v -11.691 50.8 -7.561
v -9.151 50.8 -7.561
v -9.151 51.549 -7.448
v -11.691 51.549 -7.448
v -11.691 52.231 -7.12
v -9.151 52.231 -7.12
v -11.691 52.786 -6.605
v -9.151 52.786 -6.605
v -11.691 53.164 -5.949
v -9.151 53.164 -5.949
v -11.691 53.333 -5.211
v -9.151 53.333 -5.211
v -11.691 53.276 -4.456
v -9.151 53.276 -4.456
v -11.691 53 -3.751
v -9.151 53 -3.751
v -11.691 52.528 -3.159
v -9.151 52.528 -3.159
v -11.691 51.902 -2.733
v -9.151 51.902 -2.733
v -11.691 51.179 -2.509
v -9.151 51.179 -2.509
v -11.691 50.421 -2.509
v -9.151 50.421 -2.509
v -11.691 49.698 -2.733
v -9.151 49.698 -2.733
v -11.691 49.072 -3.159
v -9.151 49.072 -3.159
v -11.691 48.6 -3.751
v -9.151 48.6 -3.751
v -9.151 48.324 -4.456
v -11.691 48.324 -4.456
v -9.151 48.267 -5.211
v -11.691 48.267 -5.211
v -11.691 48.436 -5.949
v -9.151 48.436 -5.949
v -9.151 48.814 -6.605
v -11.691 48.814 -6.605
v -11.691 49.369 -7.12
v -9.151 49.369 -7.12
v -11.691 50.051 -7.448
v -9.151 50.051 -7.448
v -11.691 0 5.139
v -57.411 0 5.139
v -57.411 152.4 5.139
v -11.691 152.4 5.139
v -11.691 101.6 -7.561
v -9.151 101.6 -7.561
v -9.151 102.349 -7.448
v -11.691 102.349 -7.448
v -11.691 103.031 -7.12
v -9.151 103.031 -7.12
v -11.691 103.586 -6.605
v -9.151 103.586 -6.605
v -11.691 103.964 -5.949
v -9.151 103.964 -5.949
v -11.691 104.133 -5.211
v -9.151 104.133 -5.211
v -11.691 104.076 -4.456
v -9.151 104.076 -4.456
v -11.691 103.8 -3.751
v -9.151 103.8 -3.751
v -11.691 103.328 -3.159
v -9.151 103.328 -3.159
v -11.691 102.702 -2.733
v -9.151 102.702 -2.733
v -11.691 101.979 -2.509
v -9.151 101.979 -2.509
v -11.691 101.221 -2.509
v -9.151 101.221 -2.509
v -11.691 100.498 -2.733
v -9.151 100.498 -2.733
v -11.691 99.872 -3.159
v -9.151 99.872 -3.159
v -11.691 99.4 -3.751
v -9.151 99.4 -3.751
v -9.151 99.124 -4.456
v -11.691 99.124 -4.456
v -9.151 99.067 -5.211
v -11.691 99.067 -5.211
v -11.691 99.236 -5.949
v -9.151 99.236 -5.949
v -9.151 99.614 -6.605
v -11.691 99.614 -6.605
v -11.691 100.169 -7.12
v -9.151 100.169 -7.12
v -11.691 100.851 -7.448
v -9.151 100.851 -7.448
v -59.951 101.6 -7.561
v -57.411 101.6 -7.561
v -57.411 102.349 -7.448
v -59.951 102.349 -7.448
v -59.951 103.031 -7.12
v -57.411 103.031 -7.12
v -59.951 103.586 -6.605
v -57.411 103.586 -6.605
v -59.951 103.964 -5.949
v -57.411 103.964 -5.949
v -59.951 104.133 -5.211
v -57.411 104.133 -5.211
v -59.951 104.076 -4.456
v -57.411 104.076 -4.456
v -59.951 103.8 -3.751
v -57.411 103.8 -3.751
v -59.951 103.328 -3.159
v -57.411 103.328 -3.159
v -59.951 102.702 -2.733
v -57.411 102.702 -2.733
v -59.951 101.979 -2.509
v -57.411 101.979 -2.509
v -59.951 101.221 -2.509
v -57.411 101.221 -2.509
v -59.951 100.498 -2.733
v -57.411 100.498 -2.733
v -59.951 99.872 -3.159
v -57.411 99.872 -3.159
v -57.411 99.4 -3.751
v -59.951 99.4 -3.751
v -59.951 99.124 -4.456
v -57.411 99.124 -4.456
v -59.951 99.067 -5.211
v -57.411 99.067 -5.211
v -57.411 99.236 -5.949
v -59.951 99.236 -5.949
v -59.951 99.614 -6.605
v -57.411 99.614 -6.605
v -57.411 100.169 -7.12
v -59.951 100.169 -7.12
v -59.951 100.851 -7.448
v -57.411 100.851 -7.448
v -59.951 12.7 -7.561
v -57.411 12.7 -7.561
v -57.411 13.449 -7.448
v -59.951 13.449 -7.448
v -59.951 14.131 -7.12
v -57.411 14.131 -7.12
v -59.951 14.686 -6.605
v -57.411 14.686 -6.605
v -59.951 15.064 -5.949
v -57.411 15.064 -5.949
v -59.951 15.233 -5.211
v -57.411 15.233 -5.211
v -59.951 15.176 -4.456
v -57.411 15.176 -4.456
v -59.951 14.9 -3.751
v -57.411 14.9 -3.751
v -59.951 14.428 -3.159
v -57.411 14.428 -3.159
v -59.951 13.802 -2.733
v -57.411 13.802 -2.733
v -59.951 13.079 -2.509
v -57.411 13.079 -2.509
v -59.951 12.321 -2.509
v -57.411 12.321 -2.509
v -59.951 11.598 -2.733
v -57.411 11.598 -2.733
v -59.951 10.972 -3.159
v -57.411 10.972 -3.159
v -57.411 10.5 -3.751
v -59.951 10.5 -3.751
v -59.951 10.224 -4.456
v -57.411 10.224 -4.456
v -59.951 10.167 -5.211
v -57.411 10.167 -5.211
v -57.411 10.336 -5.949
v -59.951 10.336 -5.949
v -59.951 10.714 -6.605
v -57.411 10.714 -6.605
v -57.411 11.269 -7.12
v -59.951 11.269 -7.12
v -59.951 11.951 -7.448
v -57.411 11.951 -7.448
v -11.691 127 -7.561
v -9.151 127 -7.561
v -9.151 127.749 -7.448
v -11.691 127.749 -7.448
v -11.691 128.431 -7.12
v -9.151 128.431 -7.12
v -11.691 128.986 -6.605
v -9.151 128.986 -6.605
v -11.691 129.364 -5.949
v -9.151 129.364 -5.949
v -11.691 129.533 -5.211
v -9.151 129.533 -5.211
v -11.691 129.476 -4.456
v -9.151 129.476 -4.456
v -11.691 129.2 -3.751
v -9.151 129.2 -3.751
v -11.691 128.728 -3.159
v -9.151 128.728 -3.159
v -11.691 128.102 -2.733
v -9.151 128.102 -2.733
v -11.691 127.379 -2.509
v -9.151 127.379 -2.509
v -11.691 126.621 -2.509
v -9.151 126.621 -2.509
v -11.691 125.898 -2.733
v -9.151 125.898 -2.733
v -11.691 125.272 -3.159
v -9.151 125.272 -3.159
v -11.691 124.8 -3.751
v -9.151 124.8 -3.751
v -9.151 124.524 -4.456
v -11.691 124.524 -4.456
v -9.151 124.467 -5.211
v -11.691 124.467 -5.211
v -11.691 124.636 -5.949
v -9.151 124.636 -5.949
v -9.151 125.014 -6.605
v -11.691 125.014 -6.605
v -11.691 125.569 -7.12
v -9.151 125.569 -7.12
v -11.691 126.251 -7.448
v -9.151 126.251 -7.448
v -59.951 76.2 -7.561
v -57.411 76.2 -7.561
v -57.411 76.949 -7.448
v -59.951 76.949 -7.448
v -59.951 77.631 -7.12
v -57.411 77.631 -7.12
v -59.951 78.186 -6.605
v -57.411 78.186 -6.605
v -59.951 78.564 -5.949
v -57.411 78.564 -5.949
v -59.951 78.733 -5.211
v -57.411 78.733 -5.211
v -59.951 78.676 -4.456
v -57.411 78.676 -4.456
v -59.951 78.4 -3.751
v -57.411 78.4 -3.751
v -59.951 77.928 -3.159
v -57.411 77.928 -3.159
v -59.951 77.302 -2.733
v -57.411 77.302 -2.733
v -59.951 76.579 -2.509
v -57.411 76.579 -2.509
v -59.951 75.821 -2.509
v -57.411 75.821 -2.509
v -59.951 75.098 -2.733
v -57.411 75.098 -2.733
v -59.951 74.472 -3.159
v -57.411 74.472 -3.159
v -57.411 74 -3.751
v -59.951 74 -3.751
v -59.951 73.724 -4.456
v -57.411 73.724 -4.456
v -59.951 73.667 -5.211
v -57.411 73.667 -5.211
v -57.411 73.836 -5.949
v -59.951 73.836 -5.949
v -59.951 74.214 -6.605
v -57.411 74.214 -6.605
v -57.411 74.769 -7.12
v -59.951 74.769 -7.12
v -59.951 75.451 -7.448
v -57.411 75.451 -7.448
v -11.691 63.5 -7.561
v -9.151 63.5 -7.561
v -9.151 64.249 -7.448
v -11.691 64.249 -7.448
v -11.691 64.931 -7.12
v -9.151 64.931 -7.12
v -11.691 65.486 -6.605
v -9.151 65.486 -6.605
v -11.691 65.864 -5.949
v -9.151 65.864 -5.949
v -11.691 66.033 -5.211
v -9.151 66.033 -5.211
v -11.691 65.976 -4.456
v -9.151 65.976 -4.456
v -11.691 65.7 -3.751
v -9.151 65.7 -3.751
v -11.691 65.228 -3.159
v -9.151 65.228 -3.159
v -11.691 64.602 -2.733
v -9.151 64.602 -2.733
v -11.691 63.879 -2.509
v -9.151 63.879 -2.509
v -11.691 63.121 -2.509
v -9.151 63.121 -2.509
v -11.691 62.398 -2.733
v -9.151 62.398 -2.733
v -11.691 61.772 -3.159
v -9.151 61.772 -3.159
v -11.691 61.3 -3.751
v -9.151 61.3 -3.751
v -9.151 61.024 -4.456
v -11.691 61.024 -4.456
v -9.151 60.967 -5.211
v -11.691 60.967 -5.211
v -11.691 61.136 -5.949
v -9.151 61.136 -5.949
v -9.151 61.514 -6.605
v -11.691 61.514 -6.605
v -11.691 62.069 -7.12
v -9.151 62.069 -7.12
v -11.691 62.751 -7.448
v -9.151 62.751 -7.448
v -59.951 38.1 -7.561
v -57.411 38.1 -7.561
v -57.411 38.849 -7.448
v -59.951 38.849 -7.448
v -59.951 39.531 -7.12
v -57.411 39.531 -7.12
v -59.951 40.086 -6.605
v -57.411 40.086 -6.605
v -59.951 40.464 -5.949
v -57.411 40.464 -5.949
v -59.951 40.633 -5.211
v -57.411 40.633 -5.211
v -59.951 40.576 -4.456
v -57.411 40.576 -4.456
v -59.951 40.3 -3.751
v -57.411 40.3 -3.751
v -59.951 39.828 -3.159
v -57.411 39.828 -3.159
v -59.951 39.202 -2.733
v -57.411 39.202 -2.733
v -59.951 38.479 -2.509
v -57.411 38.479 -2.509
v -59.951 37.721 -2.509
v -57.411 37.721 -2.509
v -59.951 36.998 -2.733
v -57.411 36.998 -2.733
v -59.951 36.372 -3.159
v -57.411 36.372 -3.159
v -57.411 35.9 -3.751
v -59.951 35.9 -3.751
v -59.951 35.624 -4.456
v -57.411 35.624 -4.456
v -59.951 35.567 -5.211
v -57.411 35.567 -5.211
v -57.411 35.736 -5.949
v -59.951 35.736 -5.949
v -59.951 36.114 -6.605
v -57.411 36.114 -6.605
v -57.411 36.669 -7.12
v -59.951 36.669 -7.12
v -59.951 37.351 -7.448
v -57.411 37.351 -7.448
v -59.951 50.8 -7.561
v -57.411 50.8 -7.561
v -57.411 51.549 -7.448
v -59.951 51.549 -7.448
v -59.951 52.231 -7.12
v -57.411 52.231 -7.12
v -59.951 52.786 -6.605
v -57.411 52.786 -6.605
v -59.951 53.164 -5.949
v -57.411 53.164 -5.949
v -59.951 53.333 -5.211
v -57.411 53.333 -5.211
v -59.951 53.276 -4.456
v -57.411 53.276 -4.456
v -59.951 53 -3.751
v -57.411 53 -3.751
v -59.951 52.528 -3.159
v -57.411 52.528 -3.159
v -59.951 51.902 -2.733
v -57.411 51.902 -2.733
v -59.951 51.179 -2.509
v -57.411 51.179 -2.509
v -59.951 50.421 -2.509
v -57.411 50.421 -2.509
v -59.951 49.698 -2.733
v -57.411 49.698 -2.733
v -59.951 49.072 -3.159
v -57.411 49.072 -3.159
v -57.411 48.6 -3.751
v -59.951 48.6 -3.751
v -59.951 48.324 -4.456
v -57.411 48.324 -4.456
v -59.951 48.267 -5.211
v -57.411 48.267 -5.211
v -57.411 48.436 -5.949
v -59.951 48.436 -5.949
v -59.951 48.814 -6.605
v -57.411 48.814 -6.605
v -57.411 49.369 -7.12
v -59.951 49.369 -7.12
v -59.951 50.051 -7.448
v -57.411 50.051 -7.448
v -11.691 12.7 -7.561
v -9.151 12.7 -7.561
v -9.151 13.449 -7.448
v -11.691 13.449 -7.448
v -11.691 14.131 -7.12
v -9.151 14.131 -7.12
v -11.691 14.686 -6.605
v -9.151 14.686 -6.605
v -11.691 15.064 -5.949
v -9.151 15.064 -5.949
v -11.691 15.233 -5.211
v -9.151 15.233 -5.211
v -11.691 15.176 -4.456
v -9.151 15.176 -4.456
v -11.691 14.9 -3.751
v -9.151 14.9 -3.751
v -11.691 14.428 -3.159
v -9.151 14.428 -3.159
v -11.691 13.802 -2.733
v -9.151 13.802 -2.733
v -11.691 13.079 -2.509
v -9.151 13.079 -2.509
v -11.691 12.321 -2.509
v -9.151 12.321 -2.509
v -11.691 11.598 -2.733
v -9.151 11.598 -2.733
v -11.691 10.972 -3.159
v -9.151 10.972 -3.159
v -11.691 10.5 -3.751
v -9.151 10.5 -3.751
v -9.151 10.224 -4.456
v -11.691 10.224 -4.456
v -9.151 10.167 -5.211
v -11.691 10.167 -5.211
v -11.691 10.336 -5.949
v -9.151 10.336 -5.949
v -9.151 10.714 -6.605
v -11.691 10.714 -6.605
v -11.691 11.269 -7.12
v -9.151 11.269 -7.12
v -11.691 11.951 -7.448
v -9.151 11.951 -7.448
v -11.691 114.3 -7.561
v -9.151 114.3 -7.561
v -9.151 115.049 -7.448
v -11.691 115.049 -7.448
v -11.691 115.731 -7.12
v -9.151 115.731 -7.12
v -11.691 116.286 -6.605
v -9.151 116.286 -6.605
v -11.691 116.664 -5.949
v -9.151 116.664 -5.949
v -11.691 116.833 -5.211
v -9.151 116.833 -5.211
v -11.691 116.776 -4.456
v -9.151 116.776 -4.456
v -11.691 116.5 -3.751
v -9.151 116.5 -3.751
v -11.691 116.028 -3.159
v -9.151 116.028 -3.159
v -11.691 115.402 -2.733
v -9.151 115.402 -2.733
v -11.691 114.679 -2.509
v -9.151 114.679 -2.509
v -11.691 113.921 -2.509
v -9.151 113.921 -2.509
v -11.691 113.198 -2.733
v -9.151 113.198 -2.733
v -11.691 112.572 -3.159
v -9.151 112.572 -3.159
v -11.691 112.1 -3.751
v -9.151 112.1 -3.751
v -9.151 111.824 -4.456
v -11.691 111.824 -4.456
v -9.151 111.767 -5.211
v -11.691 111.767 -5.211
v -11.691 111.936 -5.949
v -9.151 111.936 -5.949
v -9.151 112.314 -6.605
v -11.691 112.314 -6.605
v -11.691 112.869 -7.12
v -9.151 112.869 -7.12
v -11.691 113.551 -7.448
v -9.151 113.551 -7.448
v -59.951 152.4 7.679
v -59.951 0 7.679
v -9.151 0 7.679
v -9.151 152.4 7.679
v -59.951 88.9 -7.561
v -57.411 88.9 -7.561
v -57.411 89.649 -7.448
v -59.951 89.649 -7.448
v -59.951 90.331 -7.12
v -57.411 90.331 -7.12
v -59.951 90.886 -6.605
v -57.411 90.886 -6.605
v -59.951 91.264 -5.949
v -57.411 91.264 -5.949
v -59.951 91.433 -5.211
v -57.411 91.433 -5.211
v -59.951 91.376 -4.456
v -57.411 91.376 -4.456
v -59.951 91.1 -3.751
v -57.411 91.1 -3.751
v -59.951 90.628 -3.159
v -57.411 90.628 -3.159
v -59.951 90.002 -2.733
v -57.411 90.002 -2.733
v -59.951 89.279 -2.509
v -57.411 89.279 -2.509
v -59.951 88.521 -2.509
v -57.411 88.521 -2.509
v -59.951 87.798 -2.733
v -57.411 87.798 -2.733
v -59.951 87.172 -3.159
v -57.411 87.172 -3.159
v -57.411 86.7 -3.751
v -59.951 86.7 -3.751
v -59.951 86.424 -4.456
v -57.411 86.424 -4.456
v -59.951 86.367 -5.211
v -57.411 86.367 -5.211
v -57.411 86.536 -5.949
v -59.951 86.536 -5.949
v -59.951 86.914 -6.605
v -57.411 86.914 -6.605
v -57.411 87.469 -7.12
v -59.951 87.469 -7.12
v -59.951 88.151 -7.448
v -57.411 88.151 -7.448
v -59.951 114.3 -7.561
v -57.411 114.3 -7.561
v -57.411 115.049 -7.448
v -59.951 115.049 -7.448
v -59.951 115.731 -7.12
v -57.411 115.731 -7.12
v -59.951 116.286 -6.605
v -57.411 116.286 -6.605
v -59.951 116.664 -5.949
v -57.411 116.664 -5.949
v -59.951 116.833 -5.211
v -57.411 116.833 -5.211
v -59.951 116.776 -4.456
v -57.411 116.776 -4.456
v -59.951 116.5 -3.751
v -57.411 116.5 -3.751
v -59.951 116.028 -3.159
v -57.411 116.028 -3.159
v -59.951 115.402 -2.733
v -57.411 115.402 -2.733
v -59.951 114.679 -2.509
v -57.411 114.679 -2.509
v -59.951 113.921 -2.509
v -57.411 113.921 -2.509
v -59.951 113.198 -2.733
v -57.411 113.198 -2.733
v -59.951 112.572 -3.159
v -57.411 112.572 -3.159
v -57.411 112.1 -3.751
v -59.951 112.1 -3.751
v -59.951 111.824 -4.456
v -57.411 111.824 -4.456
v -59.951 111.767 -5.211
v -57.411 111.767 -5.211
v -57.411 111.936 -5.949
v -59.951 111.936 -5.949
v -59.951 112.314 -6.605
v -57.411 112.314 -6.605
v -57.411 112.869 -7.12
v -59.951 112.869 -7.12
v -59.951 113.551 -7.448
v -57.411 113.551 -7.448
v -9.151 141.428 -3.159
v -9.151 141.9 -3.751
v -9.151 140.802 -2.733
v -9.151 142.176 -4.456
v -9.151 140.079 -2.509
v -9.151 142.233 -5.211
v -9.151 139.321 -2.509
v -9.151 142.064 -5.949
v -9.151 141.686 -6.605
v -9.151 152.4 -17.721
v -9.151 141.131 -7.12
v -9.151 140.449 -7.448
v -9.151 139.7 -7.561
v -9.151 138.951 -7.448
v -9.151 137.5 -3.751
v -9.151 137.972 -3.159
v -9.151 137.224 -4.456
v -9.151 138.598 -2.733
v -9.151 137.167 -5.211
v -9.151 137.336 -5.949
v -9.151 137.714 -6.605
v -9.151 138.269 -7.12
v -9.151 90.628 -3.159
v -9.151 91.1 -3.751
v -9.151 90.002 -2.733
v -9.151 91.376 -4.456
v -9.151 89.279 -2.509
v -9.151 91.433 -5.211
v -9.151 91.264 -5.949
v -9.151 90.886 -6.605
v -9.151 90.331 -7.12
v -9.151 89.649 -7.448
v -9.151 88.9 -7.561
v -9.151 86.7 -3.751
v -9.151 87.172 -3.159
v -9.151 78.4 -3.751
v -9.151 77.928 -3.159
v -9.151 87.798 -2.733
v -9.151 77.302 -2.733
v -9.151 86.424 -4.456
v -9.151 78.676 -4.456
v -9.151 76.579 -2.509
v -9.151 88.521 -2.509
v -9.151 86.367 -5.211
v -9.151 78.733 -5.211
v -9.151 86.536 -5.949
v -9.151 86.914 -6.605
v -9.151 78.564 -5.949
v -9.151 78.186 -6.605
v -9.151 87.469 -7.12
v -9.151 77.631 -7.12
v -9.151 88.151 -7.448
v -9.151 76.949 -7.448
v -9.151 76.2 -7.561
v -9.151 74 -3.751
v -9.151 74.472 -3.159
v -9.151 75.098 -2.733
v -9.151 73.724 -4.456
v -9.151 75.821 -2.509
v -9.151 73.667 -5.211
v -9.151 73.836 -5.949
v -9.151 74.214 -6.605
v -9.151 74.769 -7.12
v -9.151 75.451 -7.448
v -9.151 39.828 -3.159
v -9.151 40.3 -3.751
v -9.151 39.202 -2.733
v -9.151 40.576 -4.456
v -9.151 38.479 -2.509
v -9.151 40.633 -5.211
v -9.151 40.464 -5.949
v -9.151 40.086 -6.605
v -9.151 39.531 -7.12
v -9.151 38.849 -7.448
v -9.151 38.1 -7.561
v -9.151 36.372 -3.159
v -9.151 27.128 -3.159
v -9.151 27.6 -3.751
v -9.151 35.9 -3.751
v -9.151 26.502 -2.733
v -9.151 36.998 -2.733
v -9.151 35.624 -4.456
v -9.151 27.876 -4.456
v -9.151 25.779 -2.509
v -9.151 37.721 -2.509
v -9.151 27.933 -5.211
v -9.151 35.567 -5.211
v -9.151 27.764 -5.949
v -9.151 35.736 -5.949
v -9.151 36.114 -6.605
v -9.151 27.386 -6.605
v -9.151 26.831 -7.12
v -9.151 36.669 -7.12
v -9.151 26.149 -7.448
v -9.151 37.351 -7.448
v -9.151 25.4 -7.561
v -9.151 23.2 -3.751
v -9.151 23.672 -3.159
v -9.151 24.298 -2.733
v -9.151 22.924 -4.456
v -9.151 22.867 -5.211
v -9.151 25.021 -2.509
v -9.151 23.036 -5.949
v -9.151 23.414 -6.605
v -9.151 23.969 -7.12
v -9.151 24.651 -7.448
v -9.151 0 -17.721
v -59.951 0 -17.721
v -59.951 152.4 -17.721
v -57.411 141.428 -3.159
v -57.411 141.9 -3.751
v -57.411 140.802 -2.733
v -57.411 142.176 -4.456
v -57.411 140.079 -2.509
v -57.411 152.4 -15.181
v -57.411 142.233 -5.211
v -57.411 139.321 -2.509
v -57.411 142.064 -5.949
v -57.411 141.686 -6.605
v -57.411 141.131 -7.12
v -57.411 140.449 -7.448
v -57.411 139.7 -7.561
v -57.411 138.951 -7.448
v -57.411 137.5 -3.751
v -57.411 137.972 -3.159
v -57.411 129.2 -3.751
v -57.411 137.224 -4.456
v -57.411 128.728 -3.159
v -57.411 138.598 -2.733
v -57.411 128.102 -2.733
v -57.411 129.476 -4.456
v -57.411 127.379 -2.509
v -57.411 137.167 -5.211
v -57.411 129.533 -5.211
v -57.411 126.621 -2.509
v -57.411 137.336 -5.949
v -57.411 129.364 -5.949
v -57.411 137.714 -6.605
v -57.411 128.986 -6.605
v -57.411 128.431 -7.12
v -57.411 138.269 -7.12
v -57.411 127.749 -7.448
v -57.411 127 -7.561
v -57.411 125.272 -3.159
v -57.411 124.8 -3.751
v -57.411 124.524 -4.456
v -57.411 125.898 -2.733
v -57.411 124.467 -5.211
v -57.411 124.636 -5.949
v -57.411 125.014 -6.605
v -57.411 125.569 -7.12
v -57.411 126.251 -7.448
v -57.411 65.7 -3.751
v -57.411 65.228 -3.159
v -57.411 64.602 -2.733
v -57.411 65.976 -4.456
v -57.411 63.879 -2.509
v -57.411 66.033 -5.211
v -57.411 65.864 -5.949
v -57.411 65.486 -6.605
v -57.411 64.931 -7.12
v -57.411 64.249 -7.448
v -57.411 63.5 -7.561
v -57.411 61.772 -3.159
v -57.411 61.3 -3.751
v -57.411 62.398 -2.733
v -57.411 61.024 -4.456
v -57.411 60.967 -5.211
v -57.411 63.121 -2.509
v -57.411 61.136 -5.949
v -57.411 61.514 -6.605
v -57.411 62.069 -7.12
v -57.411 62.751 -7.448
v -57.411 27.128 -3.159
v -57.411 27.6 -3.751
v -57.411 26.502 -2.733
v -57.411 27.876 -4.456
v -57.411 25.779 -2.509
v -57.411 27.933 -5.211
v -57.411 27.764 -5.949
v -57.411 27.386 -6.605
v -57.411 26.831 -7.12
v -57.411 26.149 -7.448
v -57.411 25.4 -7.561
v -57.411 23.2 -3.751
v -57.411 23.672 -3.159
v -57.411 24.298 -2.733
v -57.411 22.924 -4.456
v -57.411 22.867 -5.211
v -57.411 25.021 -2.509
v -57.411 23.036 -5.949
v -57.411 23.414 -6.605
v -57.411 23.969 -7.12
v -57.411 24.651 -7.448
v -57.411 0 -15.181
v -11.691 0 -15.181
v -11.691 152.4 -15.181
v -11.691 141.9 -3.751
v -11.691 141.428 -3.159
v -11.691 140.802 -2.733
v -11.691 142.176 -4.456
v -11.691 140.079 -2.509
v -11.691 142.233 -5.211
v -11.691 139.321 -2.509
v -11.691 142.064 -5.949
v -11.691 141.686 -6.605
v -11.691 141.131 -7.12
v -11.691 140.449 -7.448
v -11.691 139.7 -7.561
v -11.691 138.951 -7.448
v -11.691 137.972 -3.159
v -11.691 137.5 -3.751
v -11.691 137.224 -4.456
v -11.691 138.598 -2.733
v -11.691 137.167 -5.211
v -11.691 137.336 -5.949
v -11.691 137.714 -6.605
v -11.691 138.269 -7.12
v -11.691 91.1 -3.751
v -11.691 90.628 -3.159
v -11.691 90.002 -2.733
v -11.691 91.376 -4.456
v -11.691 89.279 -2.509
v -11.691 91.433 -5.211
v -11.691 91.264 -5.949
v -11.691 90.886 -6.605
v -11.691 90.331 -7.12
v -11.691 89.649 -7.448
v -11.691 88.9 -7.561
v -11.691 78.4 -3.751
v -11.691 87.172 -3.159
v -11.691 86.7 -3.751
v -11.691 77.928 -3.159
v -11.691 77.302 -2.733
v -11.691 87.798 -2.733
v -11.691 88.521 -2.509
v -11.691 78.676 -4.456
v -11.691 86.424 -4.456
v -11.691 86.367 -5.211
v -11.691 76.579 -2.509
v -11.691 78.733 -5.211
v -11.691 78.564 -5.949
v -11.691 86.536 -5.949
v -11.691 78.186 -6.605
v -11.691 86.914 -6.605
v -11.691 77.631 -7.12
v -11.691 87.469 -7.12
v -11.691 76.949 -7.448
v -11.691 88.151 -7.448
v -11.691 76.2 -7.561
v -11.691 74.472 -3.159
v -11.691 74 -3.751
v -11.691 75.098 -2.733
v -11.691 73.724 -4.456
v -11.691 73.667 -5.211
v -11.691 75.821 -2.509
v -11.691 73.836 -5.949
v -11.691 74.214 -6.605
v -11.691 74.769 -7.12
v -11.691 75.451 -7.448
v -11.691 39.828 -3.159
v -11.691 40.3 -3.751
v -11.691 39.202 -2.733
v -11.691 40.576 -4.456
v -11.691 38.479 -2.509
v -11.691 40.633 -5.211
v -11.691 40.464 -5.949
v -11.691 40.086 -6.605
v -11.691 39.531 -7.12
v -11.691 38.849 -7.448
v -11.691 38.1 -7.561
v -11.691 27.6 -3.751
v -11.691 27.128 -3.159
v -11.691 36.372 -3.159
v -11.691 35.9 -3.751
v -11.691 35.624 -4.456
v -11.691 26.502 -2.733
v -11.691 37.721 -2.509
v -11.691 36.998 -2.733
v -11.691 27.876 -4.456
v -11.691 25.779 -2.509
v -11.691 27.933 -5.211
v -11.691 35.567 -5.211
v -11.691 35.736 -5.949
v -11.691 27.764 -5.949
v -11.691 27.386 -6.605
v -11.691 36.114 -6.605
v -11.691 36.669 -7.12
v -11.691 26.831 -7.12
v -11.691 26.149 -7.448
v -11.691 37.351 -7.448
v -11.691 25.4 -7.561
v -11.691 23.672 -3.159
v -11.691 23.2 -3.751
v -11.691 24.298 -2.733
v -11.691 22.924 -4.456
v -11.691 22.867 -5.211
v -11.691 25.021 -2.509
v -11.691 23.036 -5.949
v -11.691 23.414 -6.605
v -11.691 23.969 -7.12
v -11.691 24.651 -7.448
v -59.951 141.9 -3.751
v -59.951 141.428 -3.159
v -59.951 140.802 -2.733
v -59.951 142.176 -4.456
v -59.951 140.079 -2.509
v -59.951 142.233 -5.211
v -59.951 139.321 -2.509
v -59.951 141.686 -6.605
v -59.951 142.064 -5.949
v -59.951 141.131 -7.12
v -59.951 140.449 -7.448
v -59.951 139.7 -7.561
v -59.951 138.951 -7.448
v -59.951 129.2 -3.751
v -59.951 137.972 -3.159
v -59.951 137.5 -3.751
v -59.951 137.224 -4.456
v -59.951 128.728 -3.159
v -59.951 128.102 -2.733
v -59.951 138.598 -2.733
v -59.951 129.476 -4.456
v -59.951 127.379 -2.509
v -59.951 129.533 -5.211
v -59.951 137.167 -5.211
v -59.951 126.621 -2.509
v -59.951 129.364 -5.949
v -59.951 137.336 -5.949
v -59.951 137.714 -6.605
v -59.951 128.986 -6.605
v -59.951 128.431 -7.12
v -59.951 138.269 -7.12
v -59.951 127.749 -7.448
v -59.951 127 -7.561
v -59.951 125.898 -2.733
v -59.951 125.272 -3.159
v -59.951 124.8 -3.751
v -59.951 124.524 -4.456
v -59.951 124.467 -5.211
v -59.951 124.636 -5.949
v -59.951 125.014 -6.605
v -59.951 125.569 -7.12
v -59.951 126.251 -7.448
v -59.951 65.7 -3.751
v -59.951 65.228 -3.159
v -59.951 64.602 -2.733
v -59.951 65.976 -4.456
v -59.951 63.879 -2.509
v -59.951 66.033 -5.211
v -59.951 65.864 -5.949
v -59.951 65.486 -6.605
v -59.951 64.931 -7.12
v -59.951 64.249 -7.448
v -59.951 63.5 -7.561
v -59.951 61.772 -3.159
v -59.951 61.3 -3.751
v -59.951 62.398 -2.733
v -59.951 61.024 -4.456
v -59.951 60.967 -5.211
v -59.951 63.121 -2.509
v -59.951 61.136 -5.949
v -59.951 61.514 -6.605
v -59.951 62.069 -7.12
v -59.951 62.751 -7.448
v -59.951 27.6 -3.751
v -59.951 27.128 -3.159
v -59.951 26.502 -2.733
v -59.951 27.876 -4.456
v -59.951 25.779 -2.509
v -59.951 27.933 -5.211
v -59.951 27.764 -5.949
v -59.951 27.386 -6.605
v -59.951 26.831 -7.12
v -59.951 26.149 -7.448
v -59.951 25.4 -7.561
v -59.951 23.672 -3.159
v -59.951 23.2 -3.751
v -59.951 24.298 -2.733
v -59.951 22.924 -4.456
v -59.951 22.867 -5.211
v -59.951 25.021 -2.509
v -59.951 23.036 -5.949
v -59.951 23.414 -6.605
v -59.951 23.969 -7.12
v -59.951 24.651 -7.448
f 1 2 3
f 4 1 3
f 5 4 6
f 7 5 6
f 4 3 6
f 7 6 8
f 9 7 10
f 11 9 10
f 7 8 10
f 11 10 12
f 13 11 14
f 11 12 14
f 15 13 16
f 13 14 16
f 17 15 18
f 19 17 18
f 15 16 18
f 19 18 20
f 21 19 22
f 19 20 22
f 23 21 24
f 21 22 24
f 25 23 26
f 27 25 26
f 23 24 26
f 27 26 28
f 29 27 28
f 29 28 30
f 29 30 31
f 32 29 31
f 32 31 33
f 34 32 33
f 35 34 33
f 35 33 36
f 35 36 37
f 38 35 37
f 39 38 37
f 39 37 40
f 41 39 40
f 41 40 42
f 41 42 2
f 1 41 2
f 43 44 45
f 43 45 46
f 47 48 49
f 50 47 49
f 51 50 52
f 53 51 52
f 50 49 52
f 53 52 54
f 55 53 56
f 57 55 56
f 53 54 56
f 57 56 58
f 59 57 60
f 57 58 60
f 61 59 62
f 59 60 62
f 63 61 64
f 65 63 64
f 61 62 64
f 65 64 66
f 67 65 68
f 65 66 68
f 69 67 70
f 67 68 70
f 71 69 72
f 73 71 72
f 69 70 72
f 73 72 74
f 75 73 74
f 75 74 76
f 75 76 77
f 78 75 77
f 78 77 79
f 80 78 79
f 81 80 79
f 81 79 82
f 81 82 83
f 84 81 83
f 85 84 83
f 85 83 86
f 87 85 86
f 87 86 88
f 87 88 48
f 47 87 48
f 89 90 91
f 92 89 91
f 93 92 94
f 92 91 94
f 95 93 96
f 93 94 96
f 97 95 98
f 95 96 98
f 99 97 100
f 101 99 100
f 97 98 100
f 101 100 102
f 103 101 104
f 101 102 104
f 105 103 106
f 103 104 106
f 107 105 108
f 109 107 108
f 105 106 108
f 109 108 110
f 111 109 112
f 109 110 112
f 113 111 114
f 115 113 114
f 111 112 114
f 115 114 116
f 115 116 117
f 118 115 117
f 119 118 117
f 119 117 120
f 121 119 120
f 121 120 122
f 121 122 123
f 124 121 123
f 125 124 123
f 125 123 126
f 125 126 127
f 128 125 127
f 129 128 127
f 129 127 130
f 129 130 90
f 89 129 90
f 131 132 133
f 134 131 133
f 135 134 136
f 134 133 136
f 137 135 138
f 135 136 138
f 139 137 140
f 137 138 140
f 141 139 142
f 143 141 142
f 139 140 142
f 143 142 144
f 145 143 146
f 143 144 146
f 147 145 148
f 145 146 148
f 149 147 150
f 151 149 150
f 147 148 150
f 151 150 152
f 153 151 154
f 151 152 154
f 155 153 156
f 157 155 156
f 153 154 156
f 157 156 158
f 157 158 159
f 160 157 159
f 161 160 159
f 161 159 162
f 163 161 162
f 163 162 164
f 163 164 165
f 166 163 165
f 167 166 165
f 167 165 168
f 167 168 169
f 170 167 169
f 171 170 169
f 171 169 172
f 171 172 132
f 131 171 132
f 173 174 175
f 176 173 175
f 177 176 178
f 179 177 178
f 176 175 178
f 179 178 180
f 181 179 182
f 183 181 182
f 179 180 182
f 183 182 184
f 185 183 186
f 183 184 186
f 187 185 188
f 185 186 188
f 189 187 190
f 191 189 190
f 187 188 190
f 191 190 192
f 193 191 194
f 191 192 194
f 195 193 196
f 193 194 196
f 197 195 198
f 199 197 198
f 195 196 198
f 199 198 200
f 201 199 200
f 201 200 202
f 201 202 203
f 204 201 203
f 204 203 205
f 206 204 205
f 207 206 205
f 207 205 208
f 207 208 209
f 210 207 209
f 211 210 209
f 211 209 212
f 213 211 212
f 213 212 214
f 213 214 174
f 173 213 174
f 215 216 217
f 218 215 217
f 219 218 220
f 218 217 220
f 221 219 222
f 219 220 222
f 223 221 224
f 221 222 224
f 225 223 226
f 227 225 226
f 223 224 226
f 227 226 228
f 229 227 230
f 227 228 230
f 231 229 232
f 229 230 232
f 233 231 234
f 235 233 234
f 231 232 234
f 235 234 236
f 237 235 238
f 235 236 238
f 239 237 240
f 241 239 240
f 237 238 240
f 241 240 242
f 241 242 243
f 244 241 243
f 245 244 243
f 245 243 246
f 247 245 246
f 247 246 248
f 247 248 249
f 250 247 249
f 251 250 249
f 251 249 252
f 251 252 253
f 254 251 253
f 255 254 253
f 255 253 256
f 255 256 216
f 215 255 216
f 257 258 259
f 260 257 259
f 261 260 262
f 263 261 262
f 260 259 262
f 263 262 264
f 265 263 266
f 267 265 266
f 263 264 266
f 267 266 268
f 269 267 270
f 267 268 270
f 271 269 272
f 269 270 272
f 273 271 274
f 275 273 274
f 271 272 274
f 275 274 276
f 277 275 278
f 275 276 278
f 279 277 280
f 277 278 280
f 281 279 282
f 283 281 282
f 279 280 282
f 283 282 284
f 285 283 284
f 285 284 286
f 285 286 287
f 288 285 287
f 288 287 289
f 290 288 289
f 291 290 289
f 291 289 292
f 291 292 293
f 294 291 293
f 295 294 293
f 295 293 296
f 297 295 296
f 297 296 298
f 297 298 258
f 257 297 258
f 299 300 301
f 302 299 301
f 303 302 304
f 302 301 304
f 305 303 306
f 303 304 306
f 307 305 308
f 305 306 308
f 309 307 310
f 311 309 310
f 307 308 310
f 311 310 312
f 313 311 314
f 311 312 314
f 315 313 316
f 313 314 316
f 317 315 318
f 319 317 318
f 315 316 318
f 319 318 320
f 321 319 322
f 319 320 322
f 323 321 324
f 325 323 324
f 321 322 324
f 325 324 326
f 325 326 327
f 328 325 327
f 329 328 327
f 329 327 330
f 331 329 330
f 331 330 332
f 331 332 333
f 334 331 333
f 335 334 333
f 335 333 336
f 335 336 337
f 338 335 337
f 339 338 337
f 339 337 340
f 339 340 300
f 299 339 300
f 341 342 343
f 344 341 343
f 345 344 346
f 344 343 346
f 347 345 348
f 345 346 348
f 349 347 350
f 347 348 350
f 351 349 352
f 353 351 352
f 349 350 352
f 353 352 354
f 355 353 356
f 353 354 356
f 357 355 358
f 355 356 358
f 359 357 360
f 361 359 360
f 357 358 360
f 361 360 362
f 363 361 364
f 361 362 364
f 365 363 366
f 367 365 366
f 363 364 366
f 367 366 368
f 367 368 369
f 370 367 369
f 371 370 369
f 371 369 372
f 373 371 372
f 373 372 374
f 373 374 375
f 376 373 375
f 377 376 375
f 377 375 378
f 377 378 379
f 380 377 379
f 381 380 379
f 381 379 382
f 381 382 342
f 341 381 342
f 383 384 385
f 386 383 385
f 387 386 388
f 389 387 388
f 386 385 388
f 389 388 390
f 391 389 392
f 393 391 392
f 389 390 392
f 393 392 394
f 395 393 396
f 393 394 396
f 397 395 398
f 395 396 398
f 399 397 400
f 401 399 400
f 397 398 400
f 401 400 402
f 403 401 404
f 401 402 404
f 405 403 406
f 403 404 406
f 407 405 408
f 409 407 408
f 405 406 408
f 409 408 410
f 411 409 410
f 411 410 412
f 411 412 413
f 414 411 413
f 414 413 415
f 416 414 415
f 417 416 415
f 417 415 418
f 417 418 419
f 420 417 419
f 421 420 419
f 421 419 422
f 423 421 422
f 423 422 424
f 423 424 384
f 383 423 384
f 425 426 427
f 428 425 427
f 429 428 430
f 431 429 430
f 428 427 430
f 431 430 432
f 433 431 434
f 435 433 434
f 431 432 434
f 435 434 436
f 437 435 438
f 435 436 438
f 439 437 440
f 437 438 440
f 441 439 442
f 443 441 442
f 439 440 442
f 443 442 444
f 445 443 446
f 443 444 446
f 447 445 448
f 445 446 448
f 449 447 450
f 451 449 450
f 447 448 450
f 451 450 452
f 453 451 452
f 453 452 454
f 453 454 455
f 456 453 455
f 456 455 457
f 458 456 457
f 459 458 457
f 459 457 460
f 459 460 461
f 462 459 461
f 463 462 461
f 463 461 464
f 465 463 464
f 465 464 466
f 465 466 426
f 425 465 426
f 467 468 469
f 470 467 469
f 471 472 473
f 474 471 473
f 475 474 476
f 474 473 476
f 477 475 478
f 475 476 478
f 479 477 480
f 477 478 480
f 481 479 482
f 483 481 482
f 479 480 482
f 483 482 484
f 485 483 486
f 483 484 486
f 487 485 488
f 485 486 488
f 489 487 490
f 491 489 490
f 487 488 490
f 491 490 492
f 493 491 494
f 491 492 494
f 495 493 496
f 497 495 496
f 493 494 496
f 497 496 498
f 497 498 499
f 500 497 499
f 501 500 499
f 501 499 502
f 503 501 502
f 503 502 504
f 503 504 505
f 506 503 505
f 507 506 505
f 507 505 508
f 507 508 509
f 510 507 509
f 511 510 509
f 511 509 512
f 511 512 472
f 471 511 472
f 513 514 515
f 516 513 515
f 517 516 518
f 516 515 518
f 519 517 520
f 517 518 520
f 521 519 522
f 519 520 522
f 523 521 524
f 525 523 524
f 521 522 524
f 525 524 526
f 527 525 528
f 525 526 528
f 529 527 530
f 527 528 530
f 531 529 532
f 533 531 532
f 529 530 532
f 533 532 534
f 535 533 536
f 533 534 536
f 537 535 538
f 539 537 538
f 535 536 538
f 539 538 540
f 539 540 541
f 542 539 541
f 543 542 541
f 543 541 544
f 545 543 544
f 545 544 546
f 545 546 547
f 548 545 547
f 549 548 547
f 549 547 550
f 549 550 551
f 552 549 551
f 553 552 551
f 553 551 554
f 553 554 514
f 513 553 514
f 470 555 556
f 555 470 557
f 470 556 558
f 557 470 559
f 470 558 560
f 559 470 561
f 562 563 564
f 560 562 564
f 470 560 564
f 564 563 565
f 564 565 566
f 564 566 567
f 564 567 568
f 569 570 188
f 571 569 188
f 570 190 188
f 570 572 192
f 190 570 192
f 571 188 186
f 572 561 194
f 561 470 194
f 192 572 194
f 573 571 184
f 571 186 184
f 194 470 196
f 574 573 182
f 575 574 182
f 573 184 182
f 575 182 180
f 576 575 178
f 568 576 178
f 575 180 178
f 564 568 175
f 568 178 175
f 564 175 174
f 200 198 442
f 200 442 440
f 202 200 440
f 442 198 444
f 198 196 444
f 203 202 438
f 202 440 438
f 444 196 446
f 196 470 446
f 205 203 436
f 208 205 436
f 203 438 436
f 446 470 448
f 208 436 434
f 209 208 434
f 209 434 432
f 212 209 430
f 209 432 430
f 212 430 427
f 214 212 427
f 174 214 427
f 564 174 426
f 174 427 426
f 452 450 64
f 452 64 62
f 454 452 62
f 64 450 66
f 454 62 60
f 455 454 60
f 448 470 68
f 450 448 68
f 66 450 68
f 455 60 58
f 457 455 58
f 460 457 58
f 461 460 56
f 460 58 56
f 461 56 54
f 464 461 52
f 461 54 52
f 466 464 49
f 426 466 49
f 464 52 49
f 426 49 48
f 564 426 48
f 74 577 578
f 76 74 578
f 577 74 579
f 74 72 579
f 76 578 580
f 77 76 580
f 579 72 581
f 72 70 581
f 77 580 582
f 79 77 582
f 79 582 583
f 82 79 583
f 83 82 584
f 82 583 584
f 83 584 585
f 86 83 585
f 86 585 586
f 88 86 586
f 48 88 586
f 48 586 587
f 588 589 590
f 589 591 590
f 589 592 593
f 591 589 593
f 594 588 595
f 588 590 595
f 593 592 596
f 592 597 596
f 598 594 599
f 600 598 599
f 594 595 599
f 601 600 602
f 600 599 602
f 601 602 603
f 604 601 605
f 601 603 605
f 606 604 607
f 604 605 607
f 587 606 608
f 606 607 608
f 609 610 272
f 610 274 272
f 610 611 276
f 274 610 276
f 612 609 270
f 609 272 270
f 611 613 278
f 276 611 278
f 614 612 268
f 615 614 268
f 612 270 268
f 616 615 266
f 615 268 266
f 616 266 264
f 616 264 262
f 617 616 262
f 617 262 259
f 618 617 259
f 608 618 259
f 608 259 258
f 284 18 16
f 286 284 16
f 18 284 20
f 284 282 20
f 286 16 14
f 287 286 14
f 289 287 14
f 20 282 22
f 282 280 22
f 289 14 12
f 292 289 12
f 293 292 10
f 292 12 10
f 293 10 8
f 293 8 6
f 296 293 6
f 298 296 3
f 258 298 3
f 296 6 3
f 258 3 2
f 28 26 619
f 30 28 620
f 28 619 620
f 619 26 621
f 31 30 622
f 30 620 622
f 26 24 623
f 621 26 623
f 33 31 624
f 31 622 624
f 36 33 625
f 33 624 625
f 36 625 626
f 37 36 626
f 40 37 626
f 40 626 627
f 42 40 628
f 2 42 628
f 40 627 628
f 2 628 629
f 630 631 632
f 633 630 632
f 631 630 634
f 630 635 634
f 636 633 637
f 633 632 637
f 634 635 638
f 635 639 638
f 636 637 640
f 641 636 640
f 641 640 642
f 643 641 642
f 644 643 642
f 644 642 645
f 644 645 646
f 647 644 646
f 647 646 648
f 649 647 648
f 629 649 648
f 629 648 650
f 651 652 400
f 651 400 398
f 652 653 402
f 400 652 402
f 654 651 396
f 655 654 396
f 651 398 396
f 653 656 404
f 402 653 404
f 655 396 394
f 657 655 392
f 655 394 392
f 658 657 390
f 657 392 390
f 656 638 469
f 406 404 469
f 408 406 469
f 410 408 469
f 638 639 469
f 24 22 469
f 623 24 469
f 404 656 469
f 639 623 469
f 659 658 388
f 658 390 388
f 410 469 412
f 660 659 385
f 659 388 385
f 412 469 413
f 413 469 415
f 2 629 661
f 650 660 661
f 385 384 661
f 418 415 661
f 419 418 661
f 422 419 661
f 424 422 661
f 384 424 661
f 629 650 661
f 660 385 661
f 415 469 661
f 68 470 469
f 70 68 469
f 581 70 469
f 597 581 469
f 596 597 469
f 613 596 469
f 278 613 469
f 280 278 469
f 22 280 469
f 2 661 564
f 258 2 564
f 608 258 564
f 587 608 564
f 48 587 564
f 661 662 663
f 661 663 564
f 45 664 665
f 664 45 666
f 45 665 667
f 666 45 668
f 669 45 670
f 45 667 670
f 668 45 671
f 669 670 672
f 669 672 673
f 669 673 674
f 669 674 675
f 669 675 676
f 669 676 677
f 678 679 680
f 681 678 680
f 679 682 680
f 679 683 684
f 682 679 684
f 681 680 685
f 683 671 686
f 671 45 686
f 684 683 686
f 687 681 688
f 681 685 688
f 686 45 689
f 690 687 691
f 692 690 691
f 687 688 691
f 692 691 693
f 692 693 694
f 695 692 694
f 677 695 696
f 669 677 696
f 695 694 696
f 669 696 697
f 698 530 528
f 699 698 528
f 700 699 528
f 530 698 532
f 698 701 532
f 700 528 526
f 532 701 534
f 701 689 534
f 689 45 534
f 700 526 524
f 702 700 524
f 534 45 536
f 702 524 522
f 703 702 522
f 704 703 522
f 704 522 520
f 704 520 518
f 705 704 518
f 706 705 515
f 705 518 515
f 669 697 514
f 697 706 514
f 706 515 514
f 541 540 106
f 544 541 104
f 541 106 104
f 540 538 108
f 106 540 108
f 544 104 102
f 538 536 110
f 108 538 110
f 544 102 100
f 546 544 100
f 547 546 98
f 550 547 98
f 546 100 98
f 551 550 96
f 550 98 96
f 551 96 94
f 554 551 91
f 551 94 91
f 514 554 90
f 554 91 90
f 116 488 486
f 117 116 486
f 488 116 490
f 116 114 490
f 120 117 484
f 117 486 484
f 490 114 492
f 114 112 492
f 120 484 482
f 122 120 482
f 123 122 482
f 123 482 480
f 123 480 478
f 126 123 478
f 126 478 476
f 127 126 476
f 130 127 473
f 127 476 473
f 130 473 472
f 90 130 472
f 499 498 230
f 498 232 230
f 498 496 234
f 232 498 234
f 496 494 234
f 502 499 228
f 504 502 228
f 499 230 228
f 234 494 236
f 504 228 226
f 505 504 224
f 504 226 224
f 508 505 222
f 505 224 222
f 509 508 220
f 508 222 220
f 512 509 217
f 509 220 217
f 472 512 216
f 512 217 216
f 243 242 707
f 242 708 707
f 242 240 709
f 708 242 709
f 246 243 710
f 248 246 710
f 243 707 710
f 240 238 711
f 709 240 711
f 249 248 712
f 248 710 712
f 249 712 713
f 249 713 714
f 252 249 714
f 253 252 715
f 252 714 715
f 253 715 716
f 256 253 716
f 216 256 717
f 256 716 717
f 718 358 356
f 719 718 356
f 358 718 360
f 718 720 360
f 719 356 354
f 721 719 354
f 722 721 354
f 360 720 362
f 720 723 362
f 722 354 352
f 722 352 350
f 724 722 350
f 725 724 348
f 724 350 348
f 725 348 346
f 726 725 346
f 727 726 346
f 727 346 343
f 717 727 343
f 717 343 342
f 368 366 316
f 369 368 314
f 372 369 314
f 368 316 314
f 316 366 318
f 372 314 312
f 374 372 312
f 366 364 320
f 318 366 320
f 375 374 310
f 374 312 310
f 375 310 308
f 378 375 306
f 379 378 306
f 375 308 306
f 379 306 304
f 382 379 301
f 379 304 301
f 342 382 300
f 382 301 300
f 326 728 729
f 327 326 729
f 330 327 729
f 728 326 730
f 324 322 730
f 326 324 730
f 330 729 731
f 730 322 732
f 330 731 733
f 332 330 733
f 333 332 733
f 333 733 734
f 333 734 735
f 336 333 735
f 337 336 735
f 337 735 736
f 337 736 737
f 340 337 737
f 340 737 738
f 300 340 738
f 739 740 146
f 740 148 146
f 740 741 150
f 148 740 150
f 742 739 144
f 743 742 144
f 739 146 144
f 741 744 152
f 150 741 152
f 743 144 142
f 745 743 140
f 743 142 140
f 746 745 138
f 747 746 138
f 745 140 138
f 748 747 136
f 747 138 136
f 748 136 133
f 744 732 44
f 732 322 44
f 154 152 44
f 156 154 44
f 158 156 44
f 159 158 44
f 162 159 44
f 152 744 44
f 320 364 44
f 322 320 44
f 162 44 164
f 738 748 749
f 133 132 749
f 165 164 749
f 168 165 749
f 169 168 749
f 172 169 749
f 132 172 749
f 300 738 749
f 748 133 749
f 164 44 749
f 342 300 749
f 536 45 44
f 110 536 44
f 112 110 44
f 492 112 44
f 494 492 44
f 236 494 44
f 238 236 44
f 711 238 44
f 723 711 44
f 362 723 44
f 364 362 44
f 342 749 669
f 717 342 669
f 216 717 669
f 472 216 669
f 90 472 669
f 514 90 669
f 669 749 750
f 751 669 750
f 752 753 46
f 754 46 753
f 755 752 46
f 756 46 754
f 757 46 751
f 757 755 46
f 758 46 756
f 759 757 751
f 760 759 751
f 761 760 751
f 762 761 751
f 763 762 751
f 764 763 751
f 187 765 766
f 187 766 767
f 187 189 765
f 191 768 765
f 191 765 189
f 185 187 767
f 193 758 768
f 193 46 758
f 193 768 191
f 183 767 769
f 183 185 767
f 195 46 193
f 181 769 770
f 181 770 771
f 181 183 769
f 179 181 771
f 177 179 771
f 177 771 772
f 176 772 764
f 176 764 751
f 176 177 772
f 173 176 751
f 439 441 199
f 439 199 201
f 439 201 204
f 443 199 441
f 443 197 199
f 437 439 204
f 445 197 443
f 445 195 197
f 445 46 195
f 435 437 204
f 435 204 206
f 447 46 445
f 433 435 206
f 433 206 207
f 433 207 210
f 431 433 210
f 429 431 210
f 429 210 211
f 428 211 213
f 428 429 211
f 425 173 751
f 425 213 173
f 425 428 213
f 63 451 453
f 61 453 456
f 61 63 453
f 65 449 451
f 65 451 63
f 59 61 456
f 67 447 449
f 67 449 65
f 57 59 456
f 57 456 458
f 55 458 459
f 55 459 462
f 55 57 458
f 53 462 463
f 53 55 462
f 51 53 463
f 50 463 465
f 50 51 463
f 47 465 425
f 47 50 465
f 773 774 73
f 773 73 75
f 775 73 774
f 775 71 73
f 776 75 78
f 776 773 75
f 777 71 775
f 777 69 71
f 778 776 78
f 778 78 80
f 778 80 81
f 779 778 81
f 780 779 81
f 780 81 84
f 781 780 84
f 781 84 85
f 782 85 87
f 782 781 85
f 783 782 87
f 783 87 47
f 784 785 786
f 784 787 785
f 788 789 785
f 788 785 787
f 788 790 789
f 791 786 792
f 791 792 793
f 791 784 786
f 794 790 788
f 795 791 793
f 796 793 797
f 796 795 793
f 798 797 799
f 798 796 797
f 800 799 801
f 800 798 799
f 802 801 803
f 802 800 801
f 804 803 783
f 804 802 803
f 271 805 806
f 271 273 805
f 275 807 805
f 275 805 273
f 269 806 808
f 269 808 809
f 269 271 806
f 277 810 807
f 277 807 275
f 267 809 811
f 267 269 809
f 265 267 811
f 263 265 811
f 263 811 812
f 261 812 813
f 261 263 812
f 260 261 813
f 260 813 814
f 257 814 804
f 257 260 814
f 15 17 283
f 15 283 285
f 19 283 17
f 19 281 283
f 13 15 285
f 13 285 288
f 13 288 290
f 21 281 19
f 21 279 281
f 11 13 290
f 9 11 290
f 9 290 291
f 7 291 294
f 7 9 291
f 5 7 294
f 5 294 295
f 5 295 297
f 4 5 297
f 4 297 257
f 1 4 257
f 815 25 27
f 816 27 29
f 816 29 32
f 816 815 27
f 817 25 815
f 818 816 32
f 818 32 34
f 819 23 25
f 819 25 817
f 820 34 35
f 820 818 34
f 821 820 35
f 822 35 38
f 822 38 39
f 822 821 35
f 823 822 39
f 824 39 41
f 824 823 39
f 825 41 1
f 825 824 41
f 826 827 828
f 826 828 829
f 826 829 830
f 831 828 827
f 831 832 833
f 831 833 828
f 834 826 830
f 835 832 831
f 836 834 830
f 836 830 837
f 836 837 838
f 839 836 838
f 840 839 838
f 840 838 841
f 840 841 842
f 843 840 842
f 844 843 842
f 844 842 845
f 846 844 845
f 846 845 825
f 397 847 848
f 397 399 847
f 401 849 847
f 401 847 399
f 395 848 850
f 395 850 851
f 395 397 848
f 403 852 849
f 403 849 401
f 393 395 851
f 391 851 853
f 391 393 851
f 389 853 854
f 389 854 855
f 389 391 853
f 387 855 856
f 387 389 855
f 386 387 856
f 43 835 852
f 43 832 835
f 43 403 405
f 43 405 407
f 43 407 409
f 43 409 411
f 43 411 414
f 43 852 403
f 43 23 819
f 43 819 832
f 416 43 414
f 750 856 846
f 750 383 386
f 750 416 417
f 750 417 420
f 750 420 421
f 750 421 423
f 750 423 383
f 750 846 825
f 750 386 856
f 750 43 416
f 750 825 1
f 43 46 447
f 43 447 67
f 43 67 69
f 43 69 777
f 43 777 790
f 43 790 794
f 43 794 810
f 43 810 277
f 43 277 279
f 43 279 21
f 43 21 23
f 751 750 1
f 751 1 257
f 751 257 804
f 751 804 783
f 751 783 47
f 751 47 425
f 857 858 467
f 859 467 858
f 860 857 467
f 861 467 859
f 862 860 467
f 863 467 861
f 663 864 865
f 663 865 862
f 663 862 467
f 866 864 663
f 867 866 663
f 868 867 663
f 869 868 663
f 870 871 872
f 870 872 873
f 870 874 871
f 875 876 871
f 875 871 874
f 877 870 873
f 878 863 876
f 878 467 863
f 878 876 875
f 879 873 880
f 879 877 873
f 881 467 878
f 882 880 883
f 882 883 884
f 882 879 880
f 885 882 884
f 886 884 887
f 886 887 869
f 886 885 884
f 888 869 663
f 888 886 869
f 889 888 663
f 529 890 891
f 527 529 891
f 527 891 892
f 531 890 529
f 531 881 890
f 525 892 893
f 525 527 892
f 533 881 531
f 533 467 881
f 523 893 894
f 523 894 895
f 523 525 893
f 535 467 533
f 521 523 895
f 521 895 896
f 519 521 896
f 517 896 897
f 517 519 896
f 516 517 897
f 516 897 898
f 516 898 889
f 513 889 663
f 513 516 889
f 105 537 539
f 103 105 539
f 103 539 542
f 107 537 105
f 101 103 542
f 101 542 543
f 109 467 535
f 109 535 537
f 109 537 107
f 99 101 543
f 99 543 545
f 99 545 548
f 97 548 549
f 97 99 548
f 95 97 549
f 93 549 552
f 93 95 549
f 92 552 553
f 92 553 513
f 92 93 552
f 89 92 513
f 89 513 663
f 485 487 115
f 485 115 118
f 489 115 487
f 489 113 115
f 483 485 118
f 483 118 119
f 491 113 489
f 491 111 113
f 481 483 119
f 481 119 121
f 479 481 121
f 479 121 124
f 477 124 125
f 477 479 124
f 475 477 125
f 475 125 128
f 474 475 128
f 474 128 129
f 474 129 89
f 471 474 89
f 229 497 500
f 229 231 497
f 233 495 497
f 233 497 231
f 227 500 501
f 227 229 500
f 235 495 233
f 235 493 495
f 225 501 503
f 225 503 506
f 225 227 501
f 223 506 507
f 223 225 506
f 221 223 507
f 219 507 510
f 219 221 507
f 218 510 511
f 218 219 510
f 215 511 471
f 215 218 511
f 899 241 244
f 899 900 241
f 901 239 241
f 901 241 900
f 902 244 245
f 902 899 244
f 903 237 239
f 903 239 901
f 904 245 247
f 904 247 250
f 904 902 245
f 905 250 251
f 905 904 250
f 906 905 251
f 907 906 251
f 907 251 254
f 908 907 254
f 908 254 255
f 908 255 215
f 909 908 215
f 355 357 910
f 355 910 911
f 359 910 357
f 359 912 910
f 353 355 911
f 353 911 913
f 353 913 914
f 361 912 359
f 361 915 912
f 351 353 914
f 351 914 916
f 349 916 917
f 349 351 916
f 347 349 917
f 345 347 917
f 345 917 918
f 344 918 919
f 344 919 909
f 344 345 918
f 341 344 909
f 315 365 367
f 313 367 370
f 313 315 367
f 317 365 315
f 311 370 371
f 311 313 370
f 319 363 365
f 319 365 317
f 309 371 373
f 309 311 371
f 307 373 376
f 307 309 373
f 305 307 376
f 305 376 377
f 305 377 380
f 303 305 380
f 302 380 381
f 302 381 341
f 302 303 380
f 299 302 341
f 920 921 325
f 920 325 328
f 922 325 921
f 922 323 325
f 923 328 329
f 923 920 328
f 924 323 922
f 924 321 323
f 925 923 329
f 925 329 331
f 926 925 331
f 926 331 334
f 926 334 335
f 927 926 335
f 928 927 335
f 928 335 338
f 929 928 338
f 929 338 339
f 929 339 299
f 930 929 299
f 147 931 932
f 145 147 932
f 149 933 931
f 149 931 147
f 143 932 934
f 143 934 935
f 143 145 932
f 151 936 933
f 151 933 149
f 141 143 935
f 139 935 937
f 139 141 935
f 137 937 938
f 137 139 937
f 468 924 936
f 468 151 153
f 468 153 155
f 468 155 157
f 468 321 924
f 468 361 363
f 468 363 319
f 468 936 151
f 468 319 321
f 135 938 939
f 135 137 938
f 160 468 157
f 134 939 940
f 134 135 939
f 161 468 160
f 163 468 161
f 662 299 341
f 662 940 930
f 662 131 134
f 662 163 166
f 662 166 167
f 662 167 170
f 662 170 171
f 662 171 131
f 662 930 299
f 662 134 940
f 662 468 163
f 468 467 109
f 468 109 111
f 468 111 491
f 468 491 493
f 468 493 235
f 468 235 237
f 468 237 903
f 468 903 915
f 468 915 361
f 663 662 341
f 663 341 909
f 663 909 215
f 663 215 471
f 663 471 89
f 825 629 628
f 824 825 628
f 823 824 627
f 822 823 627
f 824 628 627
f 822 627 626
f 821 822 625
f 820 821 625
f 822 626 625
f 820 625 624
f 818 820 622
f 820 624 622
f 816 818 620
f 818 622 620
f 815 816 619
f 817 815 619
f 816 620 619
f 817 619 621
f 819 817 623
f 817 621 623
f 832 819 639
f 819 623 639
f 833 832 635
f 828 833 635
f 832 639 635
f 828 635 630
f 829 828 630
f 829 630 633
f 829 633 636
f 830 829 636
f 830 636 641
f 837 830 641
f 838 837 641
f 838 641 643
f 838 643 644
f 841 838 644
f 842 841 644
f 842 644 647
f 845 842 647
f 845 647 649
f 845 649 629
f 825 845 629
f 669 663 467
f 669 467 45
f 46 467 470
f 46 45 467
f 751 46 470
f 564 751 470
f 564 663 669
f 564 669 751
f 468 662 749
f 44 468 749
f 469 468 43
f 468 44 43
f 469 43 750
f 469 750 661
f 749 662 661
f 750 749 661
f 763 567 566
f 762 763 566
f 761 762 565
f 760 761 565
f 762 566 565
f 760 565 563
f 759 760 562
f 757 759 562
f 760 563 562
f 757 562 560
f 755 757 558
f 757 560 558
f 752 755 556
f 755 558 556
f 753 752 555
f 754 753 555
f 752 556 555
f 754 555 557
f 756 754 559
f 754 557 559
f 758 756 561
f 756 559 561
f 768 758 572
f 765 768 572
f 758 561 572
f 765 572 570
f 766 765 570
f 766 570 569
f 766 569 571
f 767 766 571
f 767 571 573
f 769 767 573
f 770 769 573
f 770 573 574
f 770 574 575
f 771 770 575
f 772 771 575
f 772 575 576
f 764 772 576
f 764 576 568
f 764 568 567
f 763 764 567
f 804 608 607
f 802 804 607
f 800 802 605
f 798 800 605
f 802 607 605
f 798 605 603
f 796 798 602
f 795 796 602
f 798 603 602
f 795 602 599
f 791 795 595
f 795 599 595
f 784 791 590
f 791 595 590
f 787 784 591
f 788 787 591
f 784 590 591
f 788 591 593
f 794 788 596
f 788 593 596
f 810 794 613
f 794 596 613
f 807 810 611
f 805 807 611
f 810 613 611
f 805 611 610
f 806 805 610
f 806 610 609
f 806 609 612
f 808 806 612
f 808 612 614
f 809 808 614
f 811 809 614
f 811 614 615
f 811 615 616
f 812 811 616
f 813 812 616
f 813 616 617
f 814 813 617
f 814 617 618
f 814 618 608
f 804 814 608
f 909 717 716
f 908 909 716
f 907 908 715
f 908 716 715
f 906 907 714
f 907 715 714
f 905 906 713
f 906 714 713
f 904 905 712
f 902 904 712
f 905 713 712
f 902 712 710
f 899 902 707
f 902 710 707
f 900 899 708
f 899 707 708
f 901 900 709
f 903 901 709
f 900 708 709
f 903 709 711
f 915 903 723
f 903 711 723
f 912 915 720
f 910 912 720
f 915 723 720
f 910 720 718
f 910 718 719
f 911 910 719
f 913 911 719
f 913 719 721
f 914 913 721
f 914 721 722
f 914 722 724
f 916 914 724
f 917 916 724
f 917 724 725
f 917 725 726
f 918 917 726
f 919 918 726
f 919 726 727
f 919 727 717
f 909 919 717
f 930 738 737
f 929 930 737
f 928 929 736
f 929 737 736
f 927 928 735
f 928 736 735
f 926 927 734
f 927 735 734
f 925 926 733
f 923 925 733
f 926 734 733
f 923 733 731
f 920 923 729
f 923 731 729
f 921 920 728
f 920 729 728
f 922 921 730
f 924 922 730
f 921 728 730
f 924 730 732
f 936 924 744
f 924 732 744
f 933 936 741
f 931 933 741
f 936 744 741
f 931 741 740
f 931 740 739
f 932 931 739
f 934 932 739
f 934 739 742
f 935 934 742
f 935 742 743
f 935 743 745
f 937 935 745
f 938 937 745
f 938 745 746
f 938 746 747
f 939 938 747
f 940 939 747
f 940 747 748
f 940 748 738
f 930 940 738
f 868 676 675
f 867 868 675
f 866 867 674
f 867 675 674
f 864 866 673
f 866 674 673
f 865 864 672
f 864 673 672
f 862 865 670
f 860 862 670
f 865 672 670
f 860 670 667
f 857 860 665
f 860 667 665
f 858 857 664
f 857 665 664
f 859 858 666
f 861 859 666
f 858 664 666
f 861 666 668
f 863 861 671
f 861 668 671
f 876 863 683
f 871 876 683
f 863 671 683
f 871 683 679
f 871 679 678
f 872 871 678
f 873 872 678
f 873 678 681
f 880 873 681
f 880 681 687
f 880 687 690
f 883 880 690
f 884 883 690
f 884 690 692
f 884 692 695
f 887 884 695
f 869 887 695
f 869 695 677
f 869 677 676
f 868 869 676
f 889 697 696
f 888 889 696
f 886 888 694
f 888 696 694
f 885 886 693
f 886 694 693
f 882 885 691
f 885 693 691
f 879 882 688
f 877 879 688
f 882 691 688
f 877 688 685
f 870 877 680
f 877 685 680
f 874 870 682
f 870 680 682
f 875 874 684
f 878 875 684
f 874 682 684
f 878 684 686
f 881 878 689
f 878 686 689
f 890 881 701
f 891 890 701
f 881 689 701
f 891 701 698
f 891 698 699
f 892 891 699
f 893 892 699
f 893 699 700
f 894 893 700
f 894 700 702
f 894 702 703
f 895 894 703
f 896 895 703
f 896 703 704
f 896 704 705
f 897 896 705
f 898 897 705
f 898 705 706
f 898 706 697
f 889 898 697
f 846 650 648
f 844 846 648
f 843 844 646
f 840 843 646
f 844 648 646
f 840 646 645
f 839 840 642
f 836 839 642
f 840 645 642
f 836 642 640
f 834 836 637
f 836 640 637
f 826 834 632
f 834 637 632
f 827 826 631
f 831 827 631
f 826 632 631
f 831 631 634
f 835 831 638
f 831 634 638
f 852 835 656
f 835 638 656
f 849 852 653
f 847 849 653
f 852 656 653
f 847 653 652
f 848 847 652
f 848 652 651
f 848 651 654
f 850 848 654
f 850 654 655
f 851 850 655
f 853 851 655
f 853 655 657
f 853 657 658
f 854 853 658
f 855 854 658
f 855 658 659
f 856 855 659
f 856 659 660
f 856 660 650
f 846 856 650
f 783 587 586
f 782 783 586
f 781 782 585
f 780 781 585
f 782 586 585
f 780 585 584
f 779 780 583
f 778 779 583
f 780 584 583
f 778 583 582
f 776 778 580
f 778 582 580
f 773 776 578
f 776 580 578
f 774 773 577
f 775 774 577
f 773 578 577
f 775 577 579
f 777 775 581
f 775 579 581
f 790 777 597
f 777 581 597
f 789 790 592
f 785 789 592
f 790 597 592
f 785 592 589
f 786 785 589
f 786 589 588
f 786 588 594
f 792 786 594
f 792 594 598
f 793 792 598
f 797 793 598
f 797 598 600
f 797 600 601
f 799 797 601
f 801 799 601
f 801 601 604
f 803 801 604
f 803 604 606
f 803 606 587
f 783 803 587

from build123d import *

# Parameters (mm, degrees)
SKETCH1_W           = 50.8
SKETCH1_H           = 25.4
SKETCH1_W_2         = 45.72
SKETCH1_H_2         = 20.32
BOSS_EXTRUDE2_DEPTH = 152.4
SKETCH2_R           = 2.54
CUT_EXTRUDE1_DEPTH  = 127


with BuildPart() as part:
    # Sketch1 → Boss-Extrude2 (new body)
    with BuildSketch(Plane(origin=(0, 0, 0), x_dir=(1, 0, 0), z_dir=(0, 1, 0))):
        with Locations((-34.550728477, 5.021125828)):
            Rectangle(SKETCH1_W, SKETCH1_H)
        with Locations((-34.550728477, 5.021125828)):
            Rectangle(SKETCH1_W_2, SKETCH1_H_2, mode=Mode.SUBTRACT)
    extrude(amount=BOSS_EXTRUDE2_DEPTH)

    # Sketch2 → Cut-Extrude1 (cut)
    with BuildSketch(Plane(origin=(-9.150728477, 0, 0), x_dir=(0, 0, -1), z_dir=(1, 0, 0))):
        with Locations((5.021125828, 139.7)):
            Circle(SKETCH2_R)
        with Locations((5.021125828, 127)):
            Circle(SKETCH2_R)
        with Locations((5.021125828, 114.3)):
            Circle(SKETCH2_R)
        with Locations((5.021125828, 101.6)):
            Circle(SKETCH2_R)
        with Locations((5.021125828, 88.9)):
            Circle(SKETCH2_R)
        with Locations((5.021125828, 76.2)):
            Circle(SKETCH2_R)
        with Locations((5.021125828, 63.5)):
            Circle(SKETCH2_R)
        with Locations((5.021125828, 50.8)):
            Circle(SKETCH2_R)
        with Locations((5.021125828, 38.1)):
            Circle(SKETCH2_R)
        with Locations((5.021125828, 25.4)):
            Circle(SKETCH2_R)
        with Locations((5.021125828, 12.7)):
            Circle(SKETCH2_R)
    extrude(amount=-CUT_EXTRUDE1_DEPTH, mode=Mode.SUBTRACT)


solid = part.part
